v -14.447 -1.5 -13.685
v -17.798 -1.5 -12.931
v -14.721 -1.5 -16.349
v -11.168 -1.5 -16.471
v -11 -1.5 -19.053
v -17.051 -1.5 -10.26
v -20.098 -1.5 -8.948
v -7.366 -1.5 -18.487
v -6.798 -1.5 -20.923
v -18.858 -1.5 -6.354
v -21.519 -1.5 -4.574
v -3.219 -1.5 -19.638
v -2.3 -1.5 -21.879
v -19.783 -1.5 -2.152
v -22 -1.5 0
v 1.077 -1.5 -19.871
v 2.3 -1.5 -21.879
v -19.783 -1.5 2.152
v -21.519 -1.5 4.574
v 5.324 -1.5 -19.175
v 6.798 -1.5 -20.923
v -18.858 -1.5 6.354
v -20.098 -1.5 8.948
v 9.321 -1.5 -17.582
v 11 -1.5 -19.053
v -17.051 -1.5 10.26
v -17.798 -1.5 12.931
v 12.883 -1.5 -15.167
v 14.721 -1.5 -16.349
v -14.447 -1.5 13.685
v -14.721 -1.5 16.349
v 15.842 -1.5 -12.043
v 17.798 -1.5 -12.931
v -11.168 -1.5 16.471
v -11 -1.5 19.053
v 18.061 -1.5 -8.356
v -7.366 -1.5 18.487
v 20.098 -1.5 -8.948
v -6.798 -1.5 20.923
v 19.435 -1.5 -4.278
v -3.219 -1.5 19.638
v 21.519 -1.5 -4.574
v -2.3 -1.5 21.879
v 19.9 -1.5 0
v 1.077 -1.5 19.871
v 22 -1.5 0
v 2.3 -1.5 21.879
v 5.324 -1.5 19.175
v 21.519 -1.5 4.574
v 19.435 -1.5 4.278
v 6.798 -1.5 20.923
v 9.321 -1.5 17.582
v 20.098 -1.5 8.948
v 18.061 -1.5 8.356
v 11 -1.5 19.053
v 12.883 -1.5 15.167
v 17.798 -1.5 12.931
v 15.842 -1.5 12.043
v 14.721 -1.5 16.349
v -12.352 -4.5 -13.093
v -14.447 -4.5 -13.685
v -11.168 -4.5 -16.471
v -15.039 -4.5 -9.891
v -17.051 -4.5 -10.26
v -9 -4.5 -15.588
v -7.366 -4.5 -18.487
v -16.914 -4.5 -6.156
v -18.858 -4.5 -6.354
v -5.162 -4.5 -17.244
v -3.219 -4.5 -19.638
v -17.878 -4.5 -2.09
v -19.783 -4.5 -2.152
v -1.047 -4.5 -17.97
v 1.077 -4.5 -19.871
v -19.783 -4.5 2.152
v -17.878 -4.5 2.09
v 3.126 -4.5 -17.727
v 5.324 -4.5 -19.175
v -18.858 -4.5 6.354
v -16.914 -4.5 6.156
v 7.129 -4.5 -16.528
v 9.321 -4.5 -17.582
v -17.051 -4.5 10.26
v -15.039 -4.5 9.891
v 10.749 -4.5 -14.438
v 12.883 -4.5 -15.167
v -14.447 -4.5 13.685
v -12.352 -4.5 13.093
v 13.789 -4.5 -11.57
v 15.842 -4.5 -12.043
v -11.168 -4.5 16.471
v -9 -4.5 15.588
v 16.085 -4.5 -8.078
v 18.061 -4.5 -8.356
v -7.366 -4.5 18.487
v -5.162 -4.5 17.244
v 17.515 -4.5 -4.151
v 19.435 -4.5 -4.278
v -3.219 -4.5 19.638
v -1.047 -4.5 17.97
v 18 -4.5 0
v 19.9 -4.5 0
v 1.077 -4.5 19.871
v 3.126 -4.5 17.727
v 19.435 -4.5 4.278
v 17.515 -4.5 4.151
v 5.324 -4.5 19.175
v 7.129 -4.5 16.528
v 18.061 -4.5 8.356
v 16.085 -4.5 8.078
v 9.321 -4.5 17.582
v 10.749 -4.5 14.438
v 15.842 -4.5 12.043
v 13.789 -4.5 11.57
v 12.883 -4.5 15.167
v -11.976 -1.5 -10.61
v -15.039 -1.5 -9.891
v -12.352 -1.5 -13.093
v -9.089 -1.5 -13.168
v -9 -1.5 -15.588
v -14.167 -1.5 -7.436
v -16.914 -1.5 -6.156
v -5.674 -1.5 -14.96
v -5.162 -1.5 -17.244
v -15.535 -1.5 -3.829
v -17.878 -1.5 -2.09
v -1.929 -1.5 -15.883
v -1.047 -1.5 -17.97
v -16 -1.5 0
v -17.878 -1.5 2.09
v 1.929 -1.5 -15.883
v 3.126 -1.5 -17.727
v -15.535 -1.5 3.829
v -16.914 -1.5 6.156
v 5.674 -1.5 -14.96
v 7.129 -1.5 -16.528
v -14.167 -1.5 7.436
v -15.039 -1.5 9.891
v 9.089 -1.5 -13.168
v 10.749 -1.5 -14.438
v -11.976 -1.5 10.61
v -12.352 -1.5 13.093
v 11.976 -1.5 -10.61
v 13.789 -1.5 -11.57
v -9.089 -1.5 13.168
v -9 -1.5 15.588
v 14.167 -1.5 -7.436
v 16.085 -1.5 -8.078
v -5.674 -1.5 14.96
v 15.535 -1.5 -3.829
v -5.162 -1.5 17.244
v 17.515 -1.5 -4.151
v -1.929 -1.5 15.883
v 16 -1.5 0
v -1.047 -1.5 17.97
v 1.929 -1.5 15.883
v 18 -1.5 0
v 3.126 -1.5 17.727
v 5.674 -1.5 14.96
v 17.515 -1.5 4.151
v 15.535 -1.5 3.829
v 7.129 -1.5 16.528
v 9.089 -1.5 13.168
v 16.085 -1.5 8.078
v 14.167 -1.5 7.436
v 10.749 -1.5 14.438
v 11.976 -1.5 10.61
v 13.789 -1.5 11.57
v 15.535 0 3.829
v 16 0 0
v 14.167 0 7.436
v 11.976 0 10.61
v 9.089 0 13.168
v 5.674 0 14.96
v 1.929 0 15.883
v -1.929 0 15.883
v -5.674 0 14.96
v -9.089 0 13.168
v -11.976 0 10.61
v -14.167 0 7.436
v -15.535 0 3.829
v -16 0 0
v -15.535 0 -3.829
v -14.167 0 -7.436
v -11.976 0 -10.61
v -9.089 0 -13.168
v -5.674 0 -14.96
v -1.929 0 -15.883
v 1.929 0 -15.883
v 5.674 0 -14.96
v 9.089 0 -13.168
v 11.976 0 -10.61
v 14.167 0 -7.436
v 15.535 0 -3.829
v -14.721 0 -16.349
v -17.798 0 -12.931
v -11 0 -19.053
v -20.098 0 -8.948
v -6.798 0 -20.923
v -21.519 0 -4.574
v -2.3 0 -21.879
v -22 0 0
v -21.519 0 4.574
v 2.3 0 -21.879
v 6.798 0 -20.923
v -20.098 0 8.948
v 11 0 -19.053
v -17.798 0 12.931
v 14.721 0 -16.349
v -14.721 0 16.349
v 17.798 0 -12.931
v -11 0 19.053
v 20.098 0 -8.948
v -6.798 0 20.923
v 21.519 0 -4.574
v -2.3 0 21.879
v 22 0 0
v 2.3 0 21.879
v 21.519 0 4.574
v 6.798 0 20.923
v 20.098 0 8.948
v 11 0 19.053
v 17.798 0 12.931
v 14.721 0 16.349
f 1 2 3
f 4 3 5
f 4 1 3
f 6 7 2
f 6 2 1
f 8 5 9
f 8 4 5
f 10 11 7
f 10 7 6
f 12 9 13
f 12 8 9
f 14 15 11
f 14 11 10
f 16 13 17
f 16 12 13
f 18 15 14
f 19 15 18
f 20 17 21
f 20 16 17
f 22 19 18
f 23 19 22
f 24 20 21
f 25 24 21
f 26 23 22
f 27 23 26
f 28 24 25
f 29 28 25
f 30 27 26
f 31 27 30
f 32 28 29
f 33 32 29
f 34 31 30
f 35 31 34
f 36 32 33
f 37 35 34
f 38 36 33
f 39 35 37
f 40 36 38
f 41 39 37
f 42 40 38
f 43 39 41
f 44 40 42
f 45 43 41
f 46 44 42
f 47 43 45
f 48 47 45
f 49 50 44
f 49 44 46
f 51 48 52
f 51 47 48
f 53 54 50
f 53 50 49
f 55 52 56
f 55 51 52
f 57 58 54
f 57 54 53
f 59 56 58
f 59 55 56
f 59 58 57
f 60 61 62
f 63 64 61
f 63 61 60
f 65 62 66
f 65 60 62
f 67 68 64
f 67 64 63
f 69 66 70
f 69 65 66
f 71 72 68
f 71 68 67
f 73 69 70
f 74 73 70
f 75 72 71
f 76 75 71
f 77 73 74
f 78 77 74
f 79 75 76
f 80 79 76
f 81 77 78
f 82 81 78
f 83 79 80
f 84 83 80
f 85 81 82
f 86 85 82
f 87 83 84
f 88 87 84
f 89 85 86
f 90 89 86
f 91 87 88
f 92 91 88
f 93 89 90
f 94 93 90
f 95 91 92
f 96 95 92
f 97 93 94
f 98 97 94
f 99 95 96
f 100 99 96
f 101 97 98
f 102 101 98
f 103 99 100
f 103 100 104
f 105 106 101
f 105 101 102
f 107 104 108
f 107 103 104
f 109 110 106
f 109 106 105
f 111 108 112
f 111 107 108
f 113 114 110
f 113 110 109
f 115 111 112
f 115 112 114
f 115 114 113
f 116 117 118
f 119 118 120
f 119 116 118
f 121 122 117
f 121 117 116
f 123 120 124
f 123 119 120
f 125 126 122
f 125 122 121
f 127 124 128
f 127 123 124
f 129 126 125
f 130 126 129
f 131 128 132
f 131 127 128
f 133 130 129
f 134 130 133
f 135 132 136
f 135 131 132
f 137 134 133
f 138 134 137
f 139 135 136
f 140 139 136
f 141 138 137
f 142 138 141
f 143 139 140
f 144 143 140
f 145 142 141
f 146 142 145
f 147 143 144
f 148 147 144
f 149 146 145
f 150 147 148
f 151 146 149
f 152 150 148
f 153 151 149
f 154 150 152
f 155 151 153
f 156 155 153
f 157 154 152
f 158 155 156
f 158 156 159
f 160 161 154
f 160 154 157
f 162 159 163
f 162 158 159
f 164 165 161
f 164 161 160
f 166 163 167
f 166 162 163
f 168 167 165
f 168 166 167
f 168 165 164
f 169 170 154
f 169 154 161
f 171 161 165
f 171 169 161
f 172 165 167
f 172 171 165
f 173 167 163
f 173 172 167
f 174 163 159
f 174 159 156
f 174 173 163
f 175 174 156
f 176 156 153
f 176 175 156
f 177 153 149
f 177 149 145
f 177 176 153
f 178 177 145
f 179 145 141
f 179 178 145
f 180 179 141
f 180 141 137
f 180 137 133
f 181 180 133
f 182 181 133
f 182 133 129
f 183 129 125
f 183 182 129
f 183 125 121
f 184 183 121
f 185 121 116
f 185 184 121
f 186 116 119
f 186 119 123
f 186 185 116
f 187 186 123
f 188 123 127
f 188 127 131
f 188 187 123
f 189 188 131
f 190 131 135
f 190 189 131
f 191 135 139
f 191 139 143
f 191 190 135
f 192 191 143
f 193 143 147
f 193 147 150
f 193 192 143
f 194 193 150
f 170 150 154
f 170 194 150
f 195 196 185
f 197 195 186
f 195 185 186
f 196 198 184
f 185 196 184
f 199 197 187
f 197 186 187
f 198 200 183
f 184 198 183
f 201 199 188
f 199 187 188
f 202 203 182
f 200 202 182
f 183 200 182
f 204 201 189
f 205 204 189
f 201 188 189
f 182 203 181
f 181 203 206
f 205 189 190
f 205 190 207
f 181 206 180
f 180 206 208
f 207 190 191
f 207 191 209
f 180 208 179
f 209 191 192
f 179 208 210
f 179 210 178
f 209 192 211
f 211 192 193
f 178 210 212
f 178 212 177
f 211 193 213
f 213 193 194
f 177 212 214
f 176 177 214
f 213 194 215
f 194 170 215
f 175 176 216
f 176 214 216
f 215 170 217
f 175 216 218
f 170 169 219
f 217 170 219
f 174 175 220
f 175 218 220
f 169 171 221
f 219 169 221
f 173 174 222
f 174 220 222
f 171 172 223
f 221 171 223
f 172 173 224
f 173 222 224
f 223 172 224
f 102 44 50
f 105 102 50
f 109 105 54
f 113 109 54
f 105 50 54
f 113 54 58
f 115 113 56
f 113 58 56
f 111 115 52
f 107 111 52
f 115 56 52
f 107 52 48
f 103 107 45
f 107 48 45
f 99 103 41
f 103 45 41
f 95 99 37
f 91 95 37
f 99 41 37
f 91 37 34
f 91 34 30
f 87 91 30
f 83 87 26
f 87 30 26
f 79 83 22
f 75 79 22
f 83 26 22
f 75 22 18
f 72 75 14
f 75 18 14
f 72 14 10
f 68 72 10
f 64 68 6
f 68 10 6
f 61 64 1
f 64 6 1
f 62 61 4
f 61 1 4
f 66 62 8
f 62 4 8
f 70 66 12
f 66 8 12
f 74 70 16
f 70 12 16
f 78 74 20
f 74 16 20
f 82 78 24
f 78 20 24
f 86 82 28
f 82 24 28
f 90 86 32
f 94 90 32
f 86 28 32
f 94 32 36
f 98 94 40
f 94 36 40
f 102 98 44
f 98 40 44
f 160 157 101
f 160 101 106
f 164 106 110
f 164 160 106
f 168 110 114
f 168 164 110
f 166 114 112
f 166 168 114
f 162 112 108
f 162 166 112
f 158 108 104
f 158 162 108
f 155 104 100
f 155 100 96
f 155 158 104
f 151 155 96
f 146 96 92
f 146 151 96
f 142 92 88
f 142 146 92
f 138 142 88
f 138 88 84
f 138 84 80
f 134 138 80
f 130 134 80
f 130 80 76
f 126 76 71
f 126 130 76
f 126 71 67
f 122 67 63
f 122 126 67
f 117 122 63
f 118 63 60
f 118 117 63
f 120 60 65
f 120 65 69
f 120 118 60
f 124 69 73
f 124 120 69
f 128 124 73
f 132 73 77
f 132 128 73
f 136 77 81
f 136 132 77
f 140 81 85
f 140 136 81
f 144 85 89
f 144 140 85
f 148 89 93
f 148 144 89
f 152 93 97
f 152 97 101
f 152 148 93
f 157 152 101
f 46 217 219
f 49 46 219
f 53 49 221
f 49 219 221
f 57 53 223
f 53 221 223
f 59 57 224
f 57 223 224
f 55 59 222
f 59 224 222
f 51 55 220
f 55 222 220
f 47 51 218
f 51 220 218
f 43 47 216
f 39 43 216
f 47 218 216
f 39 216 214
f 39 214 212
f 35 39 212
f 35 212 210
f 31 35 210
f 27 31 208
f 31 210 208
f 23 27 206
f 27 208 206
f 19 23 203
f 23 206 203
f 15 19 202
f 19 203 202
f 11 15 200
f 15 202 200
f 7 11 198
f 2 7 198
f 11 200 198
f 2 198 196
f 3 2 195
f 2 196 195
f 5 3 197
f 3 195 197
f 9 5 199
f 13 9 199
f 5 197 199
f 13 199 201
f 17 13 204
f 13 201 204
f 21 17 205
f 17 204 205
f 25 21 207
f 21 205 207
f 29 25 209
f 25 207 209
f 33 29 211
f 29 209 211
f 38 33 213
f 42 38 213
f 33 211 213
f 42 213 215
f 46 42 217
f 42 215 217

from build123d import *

# Parameters (mm, degrees)
F0_R     = 22
F0_R_2   = 16
F1_DEPTH = 1.5
F2_R     = 19.9
F2_R_2   = 18
F3_DEPTH = 3


# Not quite as in the source:
# - a feature names something its author has since deleted; it is built from what else it names


with BuildPart() as f1:
    # F0 (on Front) → F1 (new body)
    with BuildSketch(Plane.XZ):
        Circle(F0_R)
        Circle(F0_R_2, mode=Mode.SUBTRACT)
    extrude(amount=F1_DEPTH)

    # F2 (on face) → F3 (join)
    with BuildSketch(Plane.XZ.offset(1.5)):
        Circle(F2_R)
        Circle(F2_R_2, mode=Mode.SUBTRACT)
    extrude(amount=F3_DEPTH)


solid = f1.part
